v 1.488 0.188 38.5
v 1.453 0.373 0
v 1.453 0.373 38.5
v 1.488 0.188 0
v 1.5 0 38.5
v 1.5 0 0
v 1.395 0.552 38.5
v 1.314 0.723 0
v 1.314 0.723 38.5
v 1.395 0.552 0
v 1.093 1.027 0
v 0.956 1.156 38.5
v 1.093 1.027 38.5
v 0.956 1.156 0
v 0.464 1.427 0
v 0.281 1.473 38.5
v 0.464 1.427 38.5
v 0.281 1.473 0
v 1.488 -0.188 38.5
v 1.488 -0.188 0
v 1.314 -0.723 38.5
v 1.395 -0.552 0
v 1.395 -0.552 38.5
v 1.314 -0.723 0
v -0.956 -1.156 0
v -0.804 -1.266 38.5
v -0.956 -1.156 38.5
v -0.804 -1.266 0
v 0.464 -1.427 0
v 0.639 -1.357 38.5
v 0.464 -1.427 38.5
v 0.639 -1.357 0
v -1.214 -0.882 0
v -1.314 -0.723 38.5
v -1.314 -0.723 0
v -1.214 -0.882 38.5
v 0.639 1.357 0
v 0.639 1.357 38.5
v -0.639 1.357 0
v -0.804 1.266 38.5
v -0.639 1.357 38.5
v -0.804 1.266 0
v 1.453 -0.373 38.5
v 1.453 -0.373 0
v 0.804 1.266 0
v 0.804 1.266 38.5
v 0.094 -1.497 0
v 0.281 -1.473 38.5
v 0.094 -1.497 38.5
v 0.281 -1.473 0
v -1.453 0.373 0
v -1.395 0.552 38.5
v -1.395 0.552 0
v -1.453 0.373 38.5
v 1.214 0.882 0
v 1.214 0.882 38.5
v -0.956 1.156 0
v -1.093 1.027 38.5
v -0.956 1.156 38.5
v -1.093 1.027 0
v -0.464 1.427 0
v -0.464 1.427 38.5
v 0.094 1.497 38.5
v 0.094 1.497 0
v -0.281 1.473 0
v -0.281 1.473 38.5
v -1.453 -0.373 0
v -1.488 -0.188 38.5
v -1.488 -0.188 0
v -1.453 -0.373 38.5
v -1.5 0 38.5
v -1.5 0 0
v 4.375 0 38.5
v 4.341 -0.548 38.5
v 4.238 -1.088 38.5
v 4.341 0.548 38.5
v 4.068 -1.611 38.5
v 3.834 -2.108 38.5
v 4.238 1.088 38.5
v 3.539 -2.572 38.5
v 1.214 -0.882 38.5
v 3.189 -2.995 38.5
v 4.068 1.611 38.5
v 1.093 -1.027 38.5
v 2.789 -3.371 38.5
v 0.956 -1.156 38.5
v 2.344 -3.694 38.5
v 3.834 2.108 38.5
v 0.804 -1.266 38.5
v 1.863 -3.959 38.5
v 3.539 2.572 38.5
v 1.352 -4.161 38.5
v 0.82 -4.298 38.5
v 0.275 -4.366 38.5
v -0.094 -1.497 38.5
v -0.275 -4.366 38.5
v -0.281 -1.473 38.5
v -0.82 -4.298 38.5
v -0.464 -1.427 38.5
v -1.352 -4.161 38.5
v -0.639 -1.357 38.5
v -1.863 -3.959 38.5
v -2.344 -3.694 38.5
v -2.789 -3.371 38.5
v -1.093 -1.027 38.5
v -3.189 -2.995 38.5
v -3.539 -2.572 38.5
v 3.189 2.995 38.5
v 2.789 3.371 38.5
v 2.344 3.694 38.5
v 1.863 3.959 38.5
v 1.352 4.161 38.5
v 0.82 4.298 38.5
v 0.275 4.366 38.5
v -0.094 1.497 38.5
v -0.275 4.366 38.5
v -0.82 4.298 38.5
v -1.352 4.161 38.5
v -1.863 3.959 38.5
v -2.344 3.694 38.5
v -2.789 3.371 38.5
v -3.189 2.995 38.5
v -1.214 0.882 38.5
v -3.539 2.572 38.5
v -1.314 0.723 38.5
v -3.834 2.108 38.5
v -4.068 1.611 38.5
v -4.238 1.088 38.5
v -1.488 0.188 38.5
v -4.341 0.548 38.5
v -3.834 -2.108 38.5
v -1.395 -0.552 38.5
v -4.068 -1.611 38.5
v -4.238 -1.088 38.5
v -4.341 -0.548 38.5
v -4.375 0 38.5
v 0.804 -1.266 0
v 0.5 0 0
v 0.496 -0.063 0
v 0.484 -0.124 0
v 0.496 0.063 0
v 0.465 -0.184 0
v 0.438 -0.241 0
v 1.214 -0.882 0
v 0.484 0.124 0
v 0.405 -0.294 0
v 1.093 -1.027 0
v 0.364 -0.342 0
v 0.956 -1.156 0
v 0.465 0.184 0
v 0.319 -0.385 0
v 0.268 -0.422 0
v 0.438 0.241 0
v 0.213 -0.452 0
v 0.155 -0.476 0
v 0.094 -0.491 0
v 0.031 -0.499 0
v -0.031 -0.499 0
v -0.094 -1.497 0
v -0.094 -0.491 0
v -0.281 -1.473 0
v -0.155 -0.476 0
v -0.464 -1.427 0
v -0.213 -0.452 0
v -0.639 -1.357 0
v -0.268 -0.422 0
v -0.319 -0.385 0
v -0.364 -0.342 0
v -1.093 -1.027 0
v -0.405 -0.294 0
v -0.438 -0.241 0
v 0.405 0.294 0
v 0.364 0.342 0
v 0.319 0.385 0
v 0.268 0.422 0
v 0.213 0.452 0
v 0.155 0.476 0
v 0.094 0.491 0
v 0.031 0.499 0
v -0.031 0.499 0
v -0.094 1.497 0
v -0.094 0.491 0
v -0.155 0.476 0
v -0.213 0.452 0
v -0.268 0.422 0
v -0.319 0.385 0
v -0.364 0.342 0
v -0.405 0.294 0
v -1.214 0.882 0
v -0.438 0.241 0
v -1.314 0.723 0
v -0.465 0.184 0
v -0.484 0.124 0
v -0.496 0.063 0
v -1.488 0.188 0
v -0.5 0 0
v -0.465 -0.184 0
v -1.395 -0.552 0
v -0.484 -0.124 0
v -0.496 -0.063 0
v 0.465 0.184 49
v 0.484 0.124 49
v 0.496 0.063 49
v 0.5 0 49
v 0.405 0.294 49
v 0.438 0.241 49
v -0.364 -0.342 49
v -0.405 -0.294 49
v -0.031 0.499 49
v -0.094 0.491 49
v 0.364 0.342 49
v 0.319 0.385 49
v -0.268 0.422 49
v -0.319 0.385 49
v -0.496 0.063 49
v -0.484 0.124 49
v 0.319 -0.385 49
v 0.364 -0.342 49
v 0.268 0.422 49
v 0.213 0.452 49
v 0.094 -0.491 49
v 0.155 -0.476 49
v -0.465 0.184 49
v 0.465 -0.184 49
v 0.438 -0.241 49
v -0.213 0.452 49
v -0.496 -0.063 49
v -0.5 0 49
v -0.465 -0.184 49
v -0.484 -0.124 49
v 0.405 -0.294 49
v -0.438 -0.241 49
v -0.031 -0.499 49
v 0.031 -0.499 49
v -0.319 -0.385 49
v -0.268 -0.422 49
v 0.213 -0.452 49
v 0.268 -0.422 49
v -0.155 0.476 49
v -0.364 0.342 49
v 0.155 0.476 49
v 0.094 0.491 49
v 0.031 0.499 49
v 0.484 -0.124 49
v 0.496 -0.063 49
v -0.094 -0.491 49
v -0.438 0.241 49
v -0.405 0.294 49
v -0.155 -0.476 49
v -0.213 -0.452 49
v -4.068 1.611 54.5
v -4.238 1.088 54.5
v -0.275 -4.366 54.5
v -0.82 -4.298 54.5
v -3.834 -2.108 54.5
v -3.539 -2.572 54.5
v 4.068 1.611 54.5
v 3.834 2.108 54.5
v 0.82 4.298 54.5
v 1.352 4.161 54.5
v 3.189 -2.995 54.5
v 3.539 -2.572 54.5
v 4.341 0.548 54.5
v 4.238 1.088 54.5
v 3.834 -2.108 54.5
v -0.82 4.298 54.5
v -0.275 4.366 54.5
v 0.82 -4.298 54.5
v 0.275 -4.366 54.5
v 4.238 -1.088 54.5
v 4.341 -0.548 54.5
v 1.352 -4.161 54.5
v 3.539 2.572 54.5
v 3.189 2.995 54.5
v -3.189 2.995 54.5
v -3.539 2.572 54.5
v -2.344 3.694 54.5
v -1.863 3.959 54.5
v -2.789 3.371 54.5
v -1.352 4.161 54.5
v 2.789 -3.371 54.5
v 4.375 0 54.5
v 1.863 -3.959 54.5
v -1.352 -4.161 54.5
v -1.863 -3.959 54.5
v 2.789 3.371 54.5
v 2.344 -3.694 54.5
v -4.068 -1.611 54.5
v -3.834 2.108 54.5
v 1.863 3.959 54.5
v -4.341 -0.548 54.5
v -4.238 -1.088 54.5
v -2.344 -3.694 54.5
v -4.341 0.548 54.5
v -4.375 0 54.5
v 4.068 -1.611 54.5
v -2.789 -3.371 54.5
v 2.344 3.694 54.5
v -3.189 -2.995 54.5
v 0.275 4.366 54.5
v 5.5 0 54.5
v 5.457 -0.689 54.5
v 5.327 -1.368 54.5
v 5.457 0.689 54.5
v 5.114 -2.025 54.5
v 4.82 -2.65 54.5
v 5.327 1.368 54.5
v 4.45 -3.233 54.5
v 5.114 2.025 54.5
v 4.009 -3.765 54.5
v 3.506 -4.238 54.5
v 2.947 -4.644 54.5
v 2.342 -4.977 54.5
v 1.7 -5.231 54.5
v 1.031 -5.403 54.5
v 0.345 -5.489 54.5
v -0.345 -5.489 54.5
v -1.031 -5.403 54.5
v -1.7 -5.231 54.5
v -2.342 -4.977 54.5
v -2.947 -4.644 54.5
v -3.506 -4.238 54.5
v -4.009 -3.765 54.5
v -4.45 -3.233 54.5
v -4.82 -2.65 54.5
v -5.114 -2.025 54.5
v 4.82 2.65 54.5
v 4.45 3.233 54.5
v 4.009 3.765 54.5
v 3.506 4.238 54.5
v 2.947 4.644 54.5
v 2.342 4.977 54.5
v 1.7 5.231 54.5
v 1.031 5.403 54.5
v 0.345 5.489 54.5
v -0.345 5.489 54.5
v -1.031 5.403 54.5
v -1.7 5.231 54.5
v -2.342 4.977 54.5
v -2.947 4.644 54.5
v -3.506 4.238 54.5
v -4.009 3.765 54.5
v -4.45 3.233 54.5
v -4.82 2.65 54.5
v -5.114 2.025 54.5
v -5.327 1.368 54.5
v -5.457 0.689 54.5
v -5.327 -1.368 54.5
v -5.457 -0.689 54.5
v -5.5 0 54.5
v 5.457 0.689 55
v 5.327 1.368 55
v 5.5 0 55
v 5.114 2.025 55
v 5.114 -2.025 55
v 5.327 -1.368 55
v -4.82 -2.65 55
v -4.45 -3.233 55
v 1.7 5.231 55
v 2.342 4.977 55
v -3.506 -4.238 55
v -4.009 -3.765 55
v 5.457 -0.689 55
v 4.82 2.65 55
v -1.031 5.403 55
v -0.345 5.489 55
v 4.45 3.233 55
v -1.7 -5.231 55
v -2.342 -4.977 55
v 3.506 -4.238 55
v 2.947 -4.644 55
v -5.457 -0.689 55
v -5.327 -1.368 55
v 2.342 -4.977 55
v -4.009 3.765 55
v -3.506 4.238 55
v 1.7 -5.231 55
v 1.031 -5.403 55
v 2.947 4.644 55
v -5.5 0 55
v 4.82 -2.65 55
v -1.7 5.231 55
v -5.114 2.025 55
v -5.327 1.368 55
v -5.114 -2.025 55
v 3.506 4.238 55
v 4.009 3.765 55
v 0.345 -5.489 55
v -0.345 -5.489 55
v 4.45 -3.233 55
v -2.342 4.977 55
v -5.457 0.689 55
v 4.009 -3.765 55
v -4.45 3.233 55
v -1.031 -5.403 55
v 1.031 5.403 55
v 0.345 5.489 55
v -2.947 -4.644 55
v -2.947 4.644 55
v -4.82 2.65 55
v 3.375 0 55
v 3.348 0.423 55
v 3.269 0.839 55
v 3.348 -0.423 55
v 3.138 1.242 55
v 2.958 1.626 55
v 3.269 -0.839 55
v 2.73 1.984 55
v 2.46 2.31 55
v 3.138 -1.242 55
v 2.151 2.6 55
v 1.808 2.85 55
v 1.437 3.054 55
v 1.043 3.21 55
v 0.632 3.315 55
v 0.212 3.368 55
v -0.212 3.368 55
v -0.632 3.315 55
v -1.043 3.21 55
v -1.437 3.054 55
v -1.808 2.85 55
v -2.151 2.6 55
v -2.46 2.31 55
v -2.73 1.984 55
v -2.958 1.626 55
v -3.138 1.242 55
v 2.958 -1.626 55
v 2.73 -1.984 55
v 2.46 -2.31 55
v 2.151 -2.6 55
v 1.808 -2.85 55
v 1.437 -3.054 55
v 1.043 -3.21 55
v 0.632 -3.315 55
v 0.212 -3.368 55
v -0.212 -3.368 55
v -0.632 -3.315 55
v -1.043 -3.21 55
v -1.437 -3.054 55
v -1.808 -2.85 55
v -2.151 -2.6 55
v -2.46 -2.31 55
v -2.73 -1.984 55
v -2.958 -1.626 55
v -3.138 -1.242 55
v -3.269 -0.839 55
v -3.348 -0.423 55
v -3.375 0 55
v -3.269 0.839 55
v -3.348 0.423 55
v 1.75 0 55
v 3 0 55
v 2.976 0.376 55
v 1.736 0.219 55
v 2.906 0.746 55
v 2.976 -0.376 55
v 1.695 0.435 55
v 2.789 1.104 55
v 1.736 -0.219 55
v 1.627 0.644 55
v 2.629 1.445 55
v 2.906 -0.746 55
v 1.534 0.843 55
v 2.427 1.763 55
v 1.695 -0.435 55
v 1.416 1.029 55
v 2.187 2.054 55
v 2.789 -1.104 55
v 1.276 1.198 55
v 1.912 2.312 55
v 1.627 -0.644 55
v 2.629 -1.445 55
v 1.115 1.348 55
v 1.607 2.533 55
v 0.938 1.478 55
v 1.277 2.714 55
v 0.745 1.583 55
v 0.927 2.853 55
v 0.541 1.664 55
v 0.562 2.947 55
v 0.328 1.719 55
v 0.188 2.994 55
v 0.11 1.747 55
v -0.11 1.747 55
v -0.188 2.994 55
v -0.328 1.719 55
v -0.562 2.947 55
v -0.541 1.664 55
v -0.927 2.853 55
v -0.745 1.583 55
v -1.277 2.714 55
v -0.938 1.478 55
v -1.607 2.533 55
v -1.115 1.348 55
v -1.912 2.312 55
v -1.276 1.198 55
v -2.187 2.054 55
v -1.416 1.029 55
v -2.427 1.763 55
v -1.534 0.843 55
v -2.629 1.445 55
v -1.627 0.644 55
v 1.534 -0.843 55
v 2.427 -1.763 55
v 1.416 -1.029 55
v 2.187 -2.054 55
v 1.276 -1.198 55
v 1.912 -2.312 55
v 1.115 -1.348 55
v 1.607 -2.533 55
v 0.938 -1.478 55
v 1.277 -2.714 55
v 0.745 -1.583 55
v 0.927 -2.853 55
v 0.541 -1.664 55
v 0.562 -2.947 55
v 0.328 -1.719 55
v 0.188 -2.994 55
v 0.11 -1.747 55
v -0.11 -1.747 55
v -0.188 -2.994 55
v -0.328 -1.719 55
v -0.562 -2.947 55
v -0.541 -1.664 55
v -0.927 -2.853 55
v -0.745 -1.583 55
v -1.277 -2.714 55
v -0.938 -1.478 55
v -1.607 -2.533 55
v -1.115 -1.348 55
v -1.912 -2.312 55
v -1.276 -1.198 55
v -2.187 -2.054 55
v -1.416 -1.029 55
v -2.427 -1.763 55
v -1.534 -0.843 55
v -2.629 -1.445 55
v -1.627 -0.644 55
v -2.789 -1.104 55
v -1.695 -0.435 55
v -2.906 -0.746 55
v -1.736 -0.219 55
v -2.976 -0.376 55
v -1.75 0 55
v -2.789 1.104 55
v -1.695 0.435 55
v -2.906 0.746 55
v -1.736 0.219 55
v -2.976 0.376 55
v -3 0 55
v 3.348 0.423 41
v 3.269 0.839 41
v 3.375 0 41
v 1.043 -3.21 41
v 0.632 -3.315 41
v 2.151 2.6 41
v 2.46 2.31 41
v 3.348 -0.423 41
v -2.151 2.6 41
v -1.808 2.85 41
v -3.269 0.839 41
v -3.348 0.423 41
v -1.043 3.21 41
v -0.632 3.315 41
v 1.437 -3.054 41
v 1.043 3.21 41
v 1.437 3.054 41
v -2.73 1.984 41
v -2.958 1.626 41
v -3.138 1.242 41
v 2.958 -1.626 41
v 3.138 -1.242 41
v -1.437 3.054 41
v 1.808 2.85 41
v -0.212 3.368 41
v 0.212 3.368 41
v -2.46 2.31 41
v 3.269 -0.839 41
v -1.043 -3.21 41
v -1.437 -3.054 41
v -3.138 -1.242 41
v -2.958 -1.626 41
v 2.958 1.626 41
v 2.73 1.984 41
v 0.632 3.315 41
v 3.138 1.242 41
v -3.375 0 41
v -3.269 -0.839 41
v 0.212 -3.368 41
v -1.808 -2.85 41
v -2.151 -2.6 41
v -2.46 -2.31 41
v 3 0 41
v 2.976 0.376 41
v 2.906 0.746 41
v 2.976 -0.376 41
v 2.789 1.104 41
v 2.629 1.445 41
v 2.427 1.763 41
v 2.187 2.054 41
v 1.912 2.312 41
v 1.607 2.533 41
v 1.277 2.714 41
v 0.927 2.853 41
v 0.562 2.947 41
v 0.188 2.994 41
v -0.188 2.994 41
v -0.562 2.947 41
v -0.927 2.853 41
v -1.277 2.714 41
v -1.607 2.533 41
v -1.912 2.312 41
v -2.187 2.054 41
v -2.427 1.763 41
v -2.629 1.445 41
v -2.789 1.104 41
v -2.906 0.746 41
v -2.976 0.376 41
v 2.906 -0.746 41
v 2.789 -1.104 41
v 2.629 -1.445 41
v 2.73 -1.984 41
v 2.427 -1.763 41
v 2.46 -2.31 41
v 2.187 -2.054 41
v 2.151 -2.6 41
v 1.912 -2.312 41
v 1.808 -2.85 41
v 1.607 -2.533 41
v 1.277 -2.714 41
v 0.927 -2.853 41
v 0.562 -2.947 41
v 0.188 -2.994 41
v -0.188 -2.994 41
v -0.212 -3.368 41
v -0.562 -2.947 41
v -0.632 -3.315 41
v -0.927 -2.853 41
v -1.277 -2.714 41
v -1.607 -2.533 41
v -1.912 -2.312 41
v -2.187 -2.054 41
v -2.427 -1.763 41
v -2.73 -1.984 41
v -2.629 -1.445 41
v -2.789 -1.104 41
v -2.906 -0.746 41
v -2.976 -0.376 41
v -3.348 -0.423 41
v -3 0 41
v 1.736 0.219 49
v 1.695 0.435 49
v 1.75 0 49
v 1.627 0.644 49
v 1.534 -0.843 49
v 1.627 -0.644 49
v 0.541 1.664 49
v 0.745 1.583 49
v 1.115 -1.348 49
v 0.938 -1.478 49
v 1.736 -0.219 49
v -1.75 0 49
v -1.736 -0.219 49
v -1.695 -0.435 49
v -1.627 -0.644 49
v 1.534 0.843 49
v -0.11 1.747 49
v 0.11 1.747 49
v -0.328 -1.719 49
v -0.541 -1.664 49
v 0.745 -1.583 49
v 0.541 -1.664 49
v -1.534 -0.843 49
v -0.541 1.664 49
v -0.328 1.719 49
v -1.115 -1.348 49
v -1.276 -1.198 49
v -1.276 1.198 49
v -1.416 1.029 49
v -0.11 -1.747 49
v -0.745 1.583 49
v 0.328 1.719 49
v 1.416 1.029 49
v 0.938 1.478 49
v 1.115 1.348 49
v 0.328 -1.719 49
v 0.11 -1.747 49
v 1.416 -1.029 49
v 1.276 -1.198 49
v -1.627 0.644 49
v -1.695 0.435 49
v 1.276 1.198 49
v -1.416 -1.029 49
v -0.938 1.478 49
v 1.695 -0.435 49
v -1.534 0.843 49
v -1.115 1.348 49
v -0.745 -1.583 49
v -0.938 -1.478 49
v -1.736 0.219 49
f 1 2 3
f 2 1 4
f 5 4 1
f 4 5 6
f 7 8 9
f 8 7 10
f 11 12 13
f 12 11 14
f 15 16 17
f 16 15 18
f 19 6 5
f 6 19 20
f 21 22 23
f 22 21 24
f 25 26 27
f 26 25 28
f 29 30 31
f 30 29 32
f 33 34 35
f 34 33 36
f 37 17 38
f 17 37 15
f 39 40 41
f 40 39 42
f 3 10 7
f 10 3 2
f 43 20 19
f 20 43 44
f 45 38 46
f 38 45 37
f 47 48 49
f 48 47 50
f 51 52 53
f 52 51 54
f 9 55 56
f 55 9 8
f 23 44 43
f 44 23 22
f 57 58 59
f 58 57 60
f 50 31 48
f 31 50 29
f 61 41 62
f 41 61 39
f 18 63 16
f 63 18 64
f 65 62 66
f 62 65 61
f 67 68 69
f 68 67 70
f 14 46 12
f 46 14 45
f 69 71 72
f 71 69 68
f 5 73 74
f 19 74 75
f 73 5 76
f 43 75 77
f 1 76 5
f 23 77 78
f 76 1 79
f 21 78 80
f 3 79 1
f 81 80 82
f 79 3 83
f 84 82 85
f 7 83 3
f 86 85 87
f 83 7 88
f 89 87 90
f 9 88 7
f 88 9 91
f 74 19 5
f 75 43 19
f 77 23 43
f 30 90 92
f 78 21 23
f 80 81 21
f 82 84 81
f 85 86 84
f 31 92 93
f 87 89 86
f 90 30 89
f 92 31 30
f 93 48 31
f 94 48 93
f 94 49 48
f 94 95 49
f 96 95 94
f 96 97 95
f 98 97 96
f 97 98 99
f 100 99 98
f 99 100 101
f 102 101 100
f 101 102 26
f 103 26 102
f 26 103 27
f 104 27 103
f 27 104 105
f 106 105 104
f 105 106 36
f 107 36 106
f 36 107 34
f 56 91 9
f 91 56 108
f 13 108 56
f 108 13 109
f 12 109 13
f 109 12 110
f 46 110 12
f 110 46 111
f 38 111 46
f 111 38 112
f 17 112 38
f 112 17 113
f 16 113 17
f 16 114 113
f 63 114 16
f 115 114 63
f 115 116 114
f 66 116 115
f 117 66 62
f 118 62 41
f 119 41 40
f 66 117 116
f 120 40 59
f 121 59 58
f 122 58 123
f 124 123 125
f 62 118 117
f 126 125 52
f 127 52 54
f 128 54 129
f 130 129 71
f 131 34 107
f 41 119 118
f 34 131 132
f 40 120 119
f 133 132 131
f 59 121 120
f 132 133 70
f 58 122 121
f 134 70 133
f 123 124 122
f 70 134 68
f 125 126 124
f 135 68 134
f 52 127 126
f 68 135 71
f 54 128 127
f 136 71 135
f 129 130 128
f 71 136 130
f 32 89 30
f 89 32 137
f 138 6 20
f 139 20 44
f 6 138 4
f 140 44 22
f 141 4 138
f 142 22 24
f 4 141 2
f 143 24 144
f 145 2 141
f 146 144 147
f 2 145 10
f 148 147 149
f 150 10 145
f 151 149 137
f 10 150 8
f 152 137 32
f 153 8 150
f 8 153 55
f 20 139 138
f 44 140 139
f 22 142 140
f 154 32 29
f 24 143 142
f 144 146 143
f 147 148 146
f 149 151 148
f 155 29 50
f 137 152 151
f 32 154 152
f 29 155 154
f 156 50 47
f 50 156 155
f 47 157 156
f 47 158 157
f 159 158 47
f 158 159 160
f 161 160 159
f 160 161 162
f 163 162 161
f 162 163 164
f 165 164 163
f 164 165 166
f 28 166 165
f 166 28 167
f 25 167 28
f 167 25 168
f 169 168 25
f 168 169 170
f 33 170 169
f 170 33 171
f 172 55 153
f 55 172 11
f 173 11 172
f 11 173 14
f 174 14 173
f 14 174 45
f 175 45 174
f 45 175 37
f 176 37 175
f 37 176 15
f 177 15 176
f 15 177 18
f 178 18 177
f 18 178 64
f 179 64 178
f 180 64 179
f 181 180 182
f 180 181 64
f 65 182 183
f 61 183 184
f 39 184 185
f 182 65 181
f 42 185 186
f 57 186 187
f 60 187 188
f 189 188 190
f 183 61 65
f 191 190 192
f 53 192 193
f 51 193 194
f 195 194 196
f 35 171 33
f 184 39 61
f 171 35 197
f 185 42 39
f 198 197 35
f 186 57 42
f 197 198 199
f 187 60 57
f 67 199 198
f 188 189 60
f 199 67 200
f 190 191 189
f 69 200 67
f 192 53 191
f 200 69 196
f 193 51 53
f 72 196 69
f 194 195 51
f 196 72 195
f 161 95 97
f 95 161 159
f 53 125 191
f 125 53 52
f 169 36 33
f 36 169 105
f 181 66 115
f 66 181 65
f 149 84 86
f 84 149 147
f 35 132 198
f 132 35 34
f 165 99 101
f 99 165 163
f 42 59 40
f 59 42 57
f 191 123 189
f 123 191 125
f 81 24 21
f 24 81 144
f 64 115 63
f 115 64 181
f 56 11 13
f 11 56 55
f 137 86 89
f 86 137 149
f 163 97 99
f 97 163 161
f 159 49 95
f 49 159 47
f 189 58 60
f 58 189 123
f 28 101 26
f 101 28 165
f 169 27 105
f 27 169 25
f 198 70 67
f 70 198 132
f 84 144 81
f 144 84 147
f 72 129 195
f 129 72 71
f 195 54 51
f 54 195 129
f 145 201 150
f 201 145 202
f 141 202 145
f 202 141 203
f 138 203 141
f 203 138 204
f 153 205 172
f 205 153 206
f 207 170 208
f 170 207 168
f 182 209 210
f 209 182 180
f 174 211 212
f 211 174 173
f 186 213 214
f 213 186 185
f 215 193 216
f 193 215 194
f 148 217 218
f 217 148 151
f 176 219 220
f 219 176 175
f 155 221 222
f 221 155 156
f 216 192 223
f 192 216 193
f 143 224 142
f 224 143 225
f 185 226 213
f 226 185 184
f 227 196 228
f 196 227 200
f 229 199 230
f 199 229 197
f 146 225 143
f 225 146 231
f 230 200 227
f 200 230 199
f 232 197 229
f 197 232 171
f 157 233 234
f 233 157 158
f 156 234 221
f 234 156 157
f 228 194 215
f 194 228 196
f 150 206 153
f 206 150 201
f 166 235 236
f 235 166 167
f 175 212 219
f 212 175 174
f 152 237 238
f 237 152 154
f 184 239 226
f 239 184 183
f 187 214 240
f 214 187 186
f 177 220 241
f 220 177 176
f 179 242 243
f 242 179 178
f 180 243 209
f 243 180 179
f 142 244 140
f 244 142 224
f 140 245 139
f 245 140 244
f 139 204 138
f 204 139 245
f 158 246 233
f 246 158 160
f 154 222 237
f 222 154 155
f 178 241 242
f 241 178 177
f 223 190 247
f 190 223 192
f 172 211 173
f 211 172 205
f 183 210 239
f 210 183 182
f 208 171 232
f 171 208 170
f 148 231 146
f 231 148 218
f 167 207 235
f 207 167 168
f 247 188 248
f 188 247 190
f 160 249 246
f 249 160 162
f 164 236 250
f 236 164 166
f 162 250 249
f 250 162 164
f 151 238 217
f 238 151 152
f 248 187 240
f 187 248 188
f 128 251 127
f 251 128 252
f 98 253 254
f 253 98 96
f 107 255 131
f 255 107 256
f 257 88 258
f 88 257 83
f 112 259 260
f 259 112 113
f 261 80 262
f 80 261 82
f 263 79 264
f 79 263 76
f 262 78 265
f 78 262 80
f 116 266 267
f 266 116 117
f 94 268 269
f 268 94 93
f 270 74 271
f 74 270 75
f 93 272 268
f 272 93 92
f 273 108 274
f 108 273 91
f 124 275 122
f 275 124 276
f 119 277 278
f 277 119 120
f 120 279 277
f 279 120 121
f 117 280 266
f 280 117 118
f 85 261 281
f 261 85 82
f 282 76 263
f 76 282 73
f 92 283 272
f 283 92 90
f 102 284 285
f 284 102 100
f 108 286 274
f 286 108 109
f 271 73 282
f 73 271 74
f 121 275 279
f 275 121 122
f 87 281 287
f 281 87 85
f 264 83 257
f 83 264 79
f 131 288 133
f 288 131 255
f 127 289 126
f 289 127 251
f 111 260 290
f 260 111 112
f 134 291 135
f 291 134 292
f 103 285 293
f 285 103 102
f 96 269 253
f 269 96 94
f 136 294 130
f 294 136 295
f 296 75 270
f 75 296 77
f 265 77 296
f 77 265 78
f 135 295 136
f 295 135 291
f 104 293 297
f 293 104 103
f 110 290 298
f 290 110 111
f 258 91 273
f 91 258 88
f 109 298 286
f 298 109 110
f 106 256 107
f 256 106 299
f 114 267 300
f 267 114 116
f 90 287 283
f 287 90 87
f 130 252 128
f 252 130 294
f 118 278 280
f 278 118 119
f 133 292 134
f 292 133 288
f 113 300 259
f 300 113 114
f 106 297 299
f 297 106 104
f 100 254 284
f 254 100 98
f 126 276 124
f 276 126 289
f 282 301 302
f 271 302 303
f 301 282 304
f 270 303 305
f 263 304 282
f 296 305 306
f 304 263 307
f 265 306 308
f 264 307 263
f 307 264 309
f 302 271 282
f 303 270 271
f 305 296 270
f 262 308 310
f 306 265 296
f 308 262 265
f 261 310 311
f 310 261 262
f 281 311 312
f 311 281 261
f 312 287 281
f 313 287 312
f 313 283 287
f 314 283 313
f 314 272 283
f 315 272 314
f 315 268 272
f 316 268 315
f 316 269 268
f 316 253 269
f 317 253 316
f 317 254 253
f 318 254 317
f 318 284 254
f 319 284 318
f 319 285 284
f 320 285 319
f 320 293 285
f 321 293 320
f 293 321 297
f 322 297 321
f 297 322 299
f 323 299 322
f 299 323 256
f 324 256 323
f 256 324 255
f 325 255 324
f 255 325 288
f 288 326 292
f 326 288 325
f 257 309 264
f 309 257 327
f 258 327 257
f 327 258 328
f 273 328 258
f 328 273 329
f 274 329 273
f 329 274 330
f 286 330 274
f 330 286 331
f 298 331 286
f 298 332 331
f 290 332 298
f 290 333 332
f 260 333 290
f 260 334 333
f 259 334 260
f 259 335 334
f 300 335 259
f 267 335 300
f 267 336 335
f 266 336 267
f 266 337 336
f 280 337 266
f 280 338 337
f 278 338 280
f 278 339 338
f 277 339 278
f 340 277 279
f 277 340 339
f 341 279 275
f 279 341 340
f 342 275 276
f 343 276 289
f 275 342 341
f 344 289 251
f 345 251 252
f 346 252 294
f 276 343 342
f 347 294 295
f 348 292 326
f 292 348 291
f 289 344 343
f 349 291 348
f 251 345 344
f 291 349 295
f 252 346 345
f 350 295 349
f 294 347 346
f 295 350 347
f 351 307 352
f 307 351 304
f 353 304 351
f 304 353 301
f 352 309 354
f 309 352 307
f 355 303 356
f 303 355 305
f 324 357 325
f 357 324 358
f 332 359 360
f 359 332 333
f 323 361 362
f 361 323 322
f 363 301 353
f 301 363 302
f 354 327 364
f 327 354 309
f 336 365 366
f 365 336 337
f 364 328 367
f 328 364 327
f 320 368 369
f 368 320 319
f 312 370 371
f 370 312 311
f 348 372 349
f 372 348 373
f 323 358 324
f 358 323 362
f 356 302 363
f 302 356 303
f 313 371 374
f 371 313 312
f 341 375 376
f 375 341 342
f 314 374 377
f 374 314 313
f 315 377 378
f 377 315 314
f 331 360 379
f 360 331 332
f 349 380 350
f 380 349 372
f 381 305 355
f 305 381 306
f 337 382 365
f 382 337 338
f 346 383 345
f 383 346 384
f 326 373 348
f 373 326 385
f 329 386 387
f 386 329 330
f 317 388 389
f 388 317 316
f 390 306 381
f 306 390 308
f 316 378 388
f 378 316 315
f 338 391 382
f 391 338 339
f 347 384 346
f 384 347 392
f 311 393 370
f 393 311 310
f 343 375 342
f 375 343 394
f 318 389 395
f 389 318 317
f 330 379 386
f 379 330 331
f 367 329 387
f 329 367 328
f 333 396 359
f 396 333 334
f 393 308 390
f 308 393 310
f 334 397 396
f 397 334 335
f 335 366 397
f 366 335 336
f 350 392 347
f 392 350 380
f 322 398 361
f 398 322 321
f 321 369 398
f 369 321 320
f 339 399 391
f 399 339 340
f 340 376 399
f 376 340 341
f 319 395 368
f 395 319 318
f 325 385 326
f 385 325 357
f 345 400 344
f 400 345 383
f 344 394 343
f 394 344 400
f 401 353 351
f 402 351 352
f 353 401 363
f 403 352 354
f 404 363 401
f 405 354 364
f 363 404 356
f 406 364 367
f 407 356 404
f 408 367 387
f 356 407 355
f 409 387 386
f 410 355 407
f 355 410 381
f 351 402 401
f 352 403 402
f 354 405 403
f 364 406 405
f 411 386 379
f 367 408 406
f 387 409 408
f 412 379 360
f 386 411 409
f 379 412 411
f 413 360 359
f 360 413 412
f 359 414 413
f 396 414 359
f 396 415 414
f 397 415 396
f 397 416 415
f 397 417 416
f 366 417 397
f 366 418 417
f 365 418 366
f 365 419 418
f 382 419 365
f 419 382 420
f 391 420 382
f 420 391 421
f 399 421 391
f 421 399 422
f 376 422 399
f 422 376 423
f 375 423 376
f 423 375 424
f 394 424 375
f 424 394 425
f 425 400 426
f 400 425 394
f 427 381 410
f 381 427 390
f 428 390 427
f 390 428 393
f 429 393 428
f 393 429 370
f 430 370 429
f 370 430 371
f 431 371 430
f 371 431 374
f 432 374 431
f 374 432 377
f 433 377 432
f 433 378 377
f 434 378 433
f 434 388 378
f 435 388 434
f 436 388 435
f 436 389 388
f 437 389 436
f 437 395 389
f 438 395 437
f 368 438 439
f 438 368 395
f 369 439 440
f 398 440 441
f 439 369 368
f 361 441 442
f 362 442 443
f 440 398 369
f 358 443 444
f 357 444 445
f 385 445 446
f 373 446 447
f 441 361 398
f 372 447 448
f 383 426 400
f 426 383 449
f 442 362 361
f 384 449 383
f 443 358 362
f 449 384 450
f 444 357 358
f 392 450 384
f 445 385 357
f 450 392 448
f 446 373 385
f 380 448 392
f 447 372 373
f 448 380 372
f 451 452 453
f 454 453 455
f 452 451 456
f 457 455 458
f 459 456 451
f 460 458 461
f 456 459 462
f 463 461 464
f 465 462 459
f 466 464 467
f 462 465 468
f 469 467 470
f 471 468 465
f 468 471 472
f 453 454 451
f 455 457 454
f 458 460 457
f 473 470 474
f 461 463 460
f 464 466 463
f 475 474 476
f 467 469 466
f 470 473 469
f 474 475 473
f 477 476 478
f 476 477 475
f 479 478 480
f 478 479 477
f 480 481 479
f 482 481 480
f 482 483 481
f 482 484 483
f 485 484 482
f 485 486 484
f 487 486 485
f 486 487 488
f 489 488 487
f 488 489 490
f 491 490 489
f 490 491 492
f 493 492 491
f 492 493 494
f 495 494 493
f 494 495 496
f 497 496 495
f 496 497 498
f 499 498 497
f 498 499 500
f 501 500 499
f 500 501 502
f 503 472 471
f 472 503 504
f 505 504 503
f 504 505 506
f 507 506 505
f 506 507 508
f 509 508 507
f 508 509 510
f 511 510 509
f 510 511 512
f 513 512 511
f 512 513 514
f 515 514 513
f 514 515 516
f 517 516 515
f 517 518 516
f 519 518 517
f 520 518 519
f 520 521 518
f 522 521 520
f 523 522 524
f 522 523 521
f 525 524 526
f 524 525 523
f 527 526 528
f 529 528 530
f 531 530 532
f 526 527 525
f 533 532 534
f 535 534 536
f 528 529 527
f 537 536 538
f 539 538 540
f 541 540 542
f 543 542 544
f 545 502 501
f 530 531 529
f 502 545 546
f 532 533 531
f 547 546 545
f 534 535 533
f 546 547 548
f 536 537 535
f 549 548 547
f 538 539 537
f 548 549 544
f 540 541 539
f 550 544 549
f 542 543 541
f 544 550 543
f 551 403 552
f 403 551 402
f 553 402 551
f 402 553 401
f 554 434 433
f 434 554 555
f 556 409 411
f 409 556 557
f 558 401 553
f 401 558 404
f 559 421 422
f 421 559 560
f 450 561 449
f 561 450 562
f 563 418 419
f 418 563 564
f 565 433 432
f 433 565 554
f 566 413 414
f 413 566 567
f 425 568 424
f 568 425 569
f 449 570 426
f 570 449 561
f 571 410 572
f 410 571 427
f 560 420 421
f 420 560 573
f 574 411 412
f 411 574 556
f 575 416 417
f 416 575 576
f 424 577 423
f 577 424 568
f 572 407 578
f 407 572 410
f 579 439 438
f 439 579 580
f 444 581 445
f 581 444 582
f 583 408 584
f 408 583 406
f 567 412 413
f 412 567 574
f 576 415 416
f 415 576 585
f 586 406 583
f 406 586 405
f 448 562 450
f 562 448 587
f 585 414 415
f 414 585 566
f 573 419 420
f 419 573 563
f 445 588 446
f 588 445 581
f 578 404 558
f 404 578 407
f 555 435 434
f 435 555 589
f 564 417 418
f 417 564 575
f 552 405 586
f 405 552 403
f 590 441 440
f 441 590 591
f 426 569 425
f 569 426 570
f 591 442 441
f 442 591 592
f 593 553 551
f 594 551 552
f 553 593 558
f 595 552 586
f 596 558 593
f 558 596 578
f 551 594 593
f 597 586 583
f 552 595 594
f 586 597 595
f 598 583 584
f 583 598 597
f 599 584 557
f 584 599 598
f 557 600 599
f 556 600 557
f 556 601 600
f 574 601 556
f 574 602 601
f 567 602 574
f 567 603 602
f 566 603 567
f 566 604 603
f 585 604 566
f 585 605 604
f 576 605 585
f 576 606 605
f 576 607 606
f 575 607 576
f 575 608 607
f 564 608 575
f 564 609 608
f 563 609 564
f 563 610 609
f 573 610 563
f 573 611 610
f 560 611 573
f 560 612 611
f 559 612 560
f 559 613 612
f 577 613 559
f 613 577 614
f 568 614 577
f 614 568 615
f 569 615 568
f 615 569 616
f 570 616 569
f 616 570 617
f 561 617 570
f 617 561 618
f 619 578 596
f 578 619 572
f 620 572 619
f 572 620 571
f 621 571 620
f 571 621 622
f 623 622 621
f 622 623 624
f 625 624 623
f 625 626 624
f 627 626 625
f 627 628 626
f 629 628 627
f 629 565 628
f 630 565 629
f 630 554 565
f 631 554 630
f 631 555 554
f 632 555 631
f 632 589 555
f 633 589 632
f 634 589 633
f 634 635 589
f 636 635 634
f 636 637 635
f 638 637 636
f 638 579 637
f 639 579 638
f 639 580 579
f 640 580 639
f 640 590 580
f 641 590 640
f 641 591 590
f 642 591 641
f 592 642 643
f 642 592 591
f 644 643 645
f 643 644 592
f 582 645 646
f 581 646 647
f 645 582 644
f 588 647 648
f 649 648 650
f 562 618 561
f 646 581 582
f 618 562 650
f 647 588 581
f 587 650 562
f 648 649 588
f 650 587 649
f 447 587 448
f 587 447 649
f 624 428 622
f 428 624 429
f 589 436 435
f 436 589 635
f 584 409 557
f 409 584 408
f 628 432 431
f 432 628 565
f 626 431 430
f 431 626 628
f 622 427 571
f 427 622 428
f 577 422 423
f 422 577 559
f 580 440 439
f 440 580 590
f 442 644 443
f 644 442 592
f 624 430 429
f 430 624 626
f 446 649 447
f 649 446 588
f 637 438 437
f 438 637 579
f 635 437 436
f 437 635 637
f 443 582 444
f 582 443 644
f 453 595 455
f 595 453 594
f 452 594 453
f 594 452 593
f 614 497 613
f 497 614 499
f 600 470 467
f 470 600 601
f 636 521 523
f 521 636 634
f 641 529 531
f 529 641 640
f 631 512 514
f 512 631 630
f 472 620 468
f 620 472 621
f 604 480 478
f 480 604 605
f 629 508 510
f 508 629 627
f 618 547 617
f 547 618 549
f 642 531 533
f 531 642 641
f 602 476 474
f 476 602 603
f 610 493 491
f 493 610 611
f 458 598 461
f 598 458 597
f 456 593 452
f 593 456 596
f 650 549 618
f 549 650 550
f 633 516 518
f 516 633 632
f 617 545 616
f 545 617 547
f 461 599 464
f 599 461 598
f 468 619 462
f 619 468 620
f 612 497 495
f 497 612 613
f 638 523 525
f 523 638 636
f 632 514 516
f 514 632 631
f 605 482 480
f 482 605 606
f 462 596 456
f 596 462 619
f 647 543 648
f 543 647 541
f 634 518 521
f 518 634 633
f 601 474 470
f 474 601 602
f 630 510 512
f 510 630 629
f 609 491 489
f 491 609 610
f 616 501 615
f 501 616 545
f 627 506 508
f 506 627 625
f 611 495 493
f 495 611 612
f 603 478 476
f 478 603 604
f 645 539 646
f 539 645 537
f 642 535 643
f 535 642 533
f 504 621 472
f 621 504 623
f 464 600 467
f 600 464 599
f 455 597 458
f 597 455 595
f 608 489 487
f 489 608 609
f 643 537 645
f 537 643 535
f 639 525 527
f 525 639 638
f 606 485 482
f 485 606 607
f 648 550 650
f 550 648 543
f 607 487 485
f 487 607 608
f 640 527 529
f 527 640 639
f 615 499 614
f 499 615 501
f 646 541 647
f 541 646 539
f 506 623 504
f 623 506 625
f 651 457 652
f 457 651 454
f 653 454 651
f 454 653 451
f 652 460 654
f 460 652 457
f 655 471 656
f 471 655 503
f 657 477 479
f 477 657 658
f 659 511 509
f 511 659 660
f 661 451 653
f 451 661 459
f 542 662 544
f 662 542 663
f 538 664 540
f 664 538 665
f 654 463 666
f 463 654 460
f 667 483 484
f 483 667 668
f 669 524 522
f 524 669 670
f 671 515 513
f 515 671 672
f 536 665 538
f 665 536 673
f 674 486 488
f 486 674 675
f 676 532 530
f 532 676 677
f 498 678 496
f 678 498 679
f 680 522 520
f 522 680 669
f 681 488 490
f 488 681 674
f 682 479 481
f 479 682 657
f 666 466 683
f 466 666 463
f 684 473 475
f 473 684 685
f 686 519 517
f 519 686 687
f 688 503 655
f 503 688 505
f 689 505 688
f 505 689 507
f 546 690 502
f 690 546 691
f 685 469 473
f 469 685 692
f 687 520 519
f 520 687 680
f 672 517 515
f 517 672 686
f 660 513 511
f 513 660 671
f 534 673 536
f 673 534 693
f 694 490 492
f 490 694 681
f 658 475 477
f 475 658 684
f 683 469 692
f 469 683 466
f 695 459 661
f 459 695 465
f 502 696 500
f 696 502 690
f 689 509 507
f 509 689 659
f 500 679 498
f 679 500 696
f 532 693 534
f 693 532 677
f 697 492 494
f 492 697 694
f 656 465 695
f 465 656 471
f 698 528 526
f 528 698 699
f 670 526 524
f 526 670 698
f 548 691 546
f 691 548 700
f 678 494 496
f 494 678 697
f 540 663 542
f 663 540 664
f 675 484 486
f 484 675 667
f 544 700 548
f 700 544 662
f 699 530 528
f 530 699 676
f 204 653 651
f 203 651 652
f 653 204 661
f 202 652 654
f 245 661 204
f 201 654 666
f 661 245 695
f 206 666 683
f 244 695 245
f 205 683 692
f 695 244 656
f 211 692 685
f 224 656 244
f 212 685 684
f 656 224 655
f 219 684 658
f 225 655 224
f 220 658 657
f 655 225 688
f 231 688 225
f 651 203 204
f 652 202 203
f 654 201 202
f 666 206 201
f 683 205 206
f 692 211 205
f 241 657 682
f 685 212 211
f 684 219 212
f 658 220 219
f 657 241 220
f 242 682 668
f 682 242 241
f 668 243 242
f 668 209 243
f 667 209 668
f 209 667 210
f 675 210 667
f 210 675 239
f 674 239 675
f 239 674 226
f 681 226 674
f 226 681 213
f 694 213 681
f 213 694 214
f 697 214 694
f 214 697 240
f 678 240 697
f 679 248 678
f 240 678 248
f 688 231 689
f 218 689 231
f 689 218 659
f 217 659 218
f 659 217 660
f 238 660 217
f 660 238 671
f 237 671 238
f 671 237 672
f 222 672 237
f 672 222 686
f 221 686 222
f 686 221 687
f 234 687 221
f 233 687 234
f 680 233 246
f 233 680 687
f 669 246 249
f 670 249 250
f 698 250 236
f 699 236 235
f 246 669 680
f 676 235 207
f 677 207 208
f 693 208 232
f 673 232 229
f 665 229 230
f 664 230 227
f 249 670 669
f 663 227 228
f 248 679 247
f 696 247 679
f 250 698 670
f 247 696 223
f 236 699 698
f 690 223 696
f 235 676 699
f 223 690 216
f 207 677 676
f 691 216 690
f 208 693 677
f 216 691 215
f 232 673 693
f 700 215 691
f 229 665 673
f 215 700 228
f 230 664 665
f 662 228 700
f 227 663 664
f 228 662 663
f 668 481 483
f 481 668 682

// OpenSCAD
$fn = 50;
vial_outer_diameter = 11;
lip_height = 0.5;
depth_into_vial = 55;

converter_metal_inner_diameter = 2.0625;
converter_metal_outer_diameter = 3.5;
converter_metal_height = 6.0; // Err slightly small here for a tight fit to create the vacuum.

converter_plastic_inner_diameter = 6.0;
converter_plastic_outer_diameter = 6.75;
converter_plastic_height = 14.0; // Err large here for a tight fit with the metal insert

fitting_excess_height = 2;
fitting_excess_diameter = 2;

fitting_height = converter_plastic_height + fitting_excess_height + lip_height;

hose_inner_diameter = 1.0;
hose_outer_diameter = 3.0;
hose_height = depth_into_vial - fitting_height;

module fitting() {
    difference() {
        union() {
            // Create a solid base for the converter to be pushed into.
            cylinder(h = converter_plastic_height + fitting_excess_height, d = converter_plastic_outer_diameter + fitting_excess_diameter);
            // Draw the lip
            translate([0, 0, converter_plastic_height + fitting_excess_height])
                cylinder(h = lip_height, d = vial_outer_diameter);
        }
        
        // Cut out space for metal converter insert
        translate([0, 0, fitting_height - converter_metal_height])
            cylinder(h = converter_metal_height, d = converter_metal_outer_diameter);
    
        // Cut out space for plastic converter insert
        translate([0, 0, fitting_height - converter_plastic_height]) {
            difference() {
                cylinder(h = converter_plastic_height, d = converter_plastic_outer_diameter);
                cylinder(h = converter_plastic_height, d = converter_plastic_inner_diameter);
            }
        }
        
        // Cut out air gap for hose
        cylinder(h = fitting_height, d = hose_inner_diameter);
    }
}

module hose() {
    difference() {
        cylinder(h = hose_height, d = hose_outer_diameter);
        cylinder(h = hose_height, d = hose_inner_diameter);
    }
}

module build() {
    hose();
    translate([0, 0, hose_height])
        fitting();
}

build();
